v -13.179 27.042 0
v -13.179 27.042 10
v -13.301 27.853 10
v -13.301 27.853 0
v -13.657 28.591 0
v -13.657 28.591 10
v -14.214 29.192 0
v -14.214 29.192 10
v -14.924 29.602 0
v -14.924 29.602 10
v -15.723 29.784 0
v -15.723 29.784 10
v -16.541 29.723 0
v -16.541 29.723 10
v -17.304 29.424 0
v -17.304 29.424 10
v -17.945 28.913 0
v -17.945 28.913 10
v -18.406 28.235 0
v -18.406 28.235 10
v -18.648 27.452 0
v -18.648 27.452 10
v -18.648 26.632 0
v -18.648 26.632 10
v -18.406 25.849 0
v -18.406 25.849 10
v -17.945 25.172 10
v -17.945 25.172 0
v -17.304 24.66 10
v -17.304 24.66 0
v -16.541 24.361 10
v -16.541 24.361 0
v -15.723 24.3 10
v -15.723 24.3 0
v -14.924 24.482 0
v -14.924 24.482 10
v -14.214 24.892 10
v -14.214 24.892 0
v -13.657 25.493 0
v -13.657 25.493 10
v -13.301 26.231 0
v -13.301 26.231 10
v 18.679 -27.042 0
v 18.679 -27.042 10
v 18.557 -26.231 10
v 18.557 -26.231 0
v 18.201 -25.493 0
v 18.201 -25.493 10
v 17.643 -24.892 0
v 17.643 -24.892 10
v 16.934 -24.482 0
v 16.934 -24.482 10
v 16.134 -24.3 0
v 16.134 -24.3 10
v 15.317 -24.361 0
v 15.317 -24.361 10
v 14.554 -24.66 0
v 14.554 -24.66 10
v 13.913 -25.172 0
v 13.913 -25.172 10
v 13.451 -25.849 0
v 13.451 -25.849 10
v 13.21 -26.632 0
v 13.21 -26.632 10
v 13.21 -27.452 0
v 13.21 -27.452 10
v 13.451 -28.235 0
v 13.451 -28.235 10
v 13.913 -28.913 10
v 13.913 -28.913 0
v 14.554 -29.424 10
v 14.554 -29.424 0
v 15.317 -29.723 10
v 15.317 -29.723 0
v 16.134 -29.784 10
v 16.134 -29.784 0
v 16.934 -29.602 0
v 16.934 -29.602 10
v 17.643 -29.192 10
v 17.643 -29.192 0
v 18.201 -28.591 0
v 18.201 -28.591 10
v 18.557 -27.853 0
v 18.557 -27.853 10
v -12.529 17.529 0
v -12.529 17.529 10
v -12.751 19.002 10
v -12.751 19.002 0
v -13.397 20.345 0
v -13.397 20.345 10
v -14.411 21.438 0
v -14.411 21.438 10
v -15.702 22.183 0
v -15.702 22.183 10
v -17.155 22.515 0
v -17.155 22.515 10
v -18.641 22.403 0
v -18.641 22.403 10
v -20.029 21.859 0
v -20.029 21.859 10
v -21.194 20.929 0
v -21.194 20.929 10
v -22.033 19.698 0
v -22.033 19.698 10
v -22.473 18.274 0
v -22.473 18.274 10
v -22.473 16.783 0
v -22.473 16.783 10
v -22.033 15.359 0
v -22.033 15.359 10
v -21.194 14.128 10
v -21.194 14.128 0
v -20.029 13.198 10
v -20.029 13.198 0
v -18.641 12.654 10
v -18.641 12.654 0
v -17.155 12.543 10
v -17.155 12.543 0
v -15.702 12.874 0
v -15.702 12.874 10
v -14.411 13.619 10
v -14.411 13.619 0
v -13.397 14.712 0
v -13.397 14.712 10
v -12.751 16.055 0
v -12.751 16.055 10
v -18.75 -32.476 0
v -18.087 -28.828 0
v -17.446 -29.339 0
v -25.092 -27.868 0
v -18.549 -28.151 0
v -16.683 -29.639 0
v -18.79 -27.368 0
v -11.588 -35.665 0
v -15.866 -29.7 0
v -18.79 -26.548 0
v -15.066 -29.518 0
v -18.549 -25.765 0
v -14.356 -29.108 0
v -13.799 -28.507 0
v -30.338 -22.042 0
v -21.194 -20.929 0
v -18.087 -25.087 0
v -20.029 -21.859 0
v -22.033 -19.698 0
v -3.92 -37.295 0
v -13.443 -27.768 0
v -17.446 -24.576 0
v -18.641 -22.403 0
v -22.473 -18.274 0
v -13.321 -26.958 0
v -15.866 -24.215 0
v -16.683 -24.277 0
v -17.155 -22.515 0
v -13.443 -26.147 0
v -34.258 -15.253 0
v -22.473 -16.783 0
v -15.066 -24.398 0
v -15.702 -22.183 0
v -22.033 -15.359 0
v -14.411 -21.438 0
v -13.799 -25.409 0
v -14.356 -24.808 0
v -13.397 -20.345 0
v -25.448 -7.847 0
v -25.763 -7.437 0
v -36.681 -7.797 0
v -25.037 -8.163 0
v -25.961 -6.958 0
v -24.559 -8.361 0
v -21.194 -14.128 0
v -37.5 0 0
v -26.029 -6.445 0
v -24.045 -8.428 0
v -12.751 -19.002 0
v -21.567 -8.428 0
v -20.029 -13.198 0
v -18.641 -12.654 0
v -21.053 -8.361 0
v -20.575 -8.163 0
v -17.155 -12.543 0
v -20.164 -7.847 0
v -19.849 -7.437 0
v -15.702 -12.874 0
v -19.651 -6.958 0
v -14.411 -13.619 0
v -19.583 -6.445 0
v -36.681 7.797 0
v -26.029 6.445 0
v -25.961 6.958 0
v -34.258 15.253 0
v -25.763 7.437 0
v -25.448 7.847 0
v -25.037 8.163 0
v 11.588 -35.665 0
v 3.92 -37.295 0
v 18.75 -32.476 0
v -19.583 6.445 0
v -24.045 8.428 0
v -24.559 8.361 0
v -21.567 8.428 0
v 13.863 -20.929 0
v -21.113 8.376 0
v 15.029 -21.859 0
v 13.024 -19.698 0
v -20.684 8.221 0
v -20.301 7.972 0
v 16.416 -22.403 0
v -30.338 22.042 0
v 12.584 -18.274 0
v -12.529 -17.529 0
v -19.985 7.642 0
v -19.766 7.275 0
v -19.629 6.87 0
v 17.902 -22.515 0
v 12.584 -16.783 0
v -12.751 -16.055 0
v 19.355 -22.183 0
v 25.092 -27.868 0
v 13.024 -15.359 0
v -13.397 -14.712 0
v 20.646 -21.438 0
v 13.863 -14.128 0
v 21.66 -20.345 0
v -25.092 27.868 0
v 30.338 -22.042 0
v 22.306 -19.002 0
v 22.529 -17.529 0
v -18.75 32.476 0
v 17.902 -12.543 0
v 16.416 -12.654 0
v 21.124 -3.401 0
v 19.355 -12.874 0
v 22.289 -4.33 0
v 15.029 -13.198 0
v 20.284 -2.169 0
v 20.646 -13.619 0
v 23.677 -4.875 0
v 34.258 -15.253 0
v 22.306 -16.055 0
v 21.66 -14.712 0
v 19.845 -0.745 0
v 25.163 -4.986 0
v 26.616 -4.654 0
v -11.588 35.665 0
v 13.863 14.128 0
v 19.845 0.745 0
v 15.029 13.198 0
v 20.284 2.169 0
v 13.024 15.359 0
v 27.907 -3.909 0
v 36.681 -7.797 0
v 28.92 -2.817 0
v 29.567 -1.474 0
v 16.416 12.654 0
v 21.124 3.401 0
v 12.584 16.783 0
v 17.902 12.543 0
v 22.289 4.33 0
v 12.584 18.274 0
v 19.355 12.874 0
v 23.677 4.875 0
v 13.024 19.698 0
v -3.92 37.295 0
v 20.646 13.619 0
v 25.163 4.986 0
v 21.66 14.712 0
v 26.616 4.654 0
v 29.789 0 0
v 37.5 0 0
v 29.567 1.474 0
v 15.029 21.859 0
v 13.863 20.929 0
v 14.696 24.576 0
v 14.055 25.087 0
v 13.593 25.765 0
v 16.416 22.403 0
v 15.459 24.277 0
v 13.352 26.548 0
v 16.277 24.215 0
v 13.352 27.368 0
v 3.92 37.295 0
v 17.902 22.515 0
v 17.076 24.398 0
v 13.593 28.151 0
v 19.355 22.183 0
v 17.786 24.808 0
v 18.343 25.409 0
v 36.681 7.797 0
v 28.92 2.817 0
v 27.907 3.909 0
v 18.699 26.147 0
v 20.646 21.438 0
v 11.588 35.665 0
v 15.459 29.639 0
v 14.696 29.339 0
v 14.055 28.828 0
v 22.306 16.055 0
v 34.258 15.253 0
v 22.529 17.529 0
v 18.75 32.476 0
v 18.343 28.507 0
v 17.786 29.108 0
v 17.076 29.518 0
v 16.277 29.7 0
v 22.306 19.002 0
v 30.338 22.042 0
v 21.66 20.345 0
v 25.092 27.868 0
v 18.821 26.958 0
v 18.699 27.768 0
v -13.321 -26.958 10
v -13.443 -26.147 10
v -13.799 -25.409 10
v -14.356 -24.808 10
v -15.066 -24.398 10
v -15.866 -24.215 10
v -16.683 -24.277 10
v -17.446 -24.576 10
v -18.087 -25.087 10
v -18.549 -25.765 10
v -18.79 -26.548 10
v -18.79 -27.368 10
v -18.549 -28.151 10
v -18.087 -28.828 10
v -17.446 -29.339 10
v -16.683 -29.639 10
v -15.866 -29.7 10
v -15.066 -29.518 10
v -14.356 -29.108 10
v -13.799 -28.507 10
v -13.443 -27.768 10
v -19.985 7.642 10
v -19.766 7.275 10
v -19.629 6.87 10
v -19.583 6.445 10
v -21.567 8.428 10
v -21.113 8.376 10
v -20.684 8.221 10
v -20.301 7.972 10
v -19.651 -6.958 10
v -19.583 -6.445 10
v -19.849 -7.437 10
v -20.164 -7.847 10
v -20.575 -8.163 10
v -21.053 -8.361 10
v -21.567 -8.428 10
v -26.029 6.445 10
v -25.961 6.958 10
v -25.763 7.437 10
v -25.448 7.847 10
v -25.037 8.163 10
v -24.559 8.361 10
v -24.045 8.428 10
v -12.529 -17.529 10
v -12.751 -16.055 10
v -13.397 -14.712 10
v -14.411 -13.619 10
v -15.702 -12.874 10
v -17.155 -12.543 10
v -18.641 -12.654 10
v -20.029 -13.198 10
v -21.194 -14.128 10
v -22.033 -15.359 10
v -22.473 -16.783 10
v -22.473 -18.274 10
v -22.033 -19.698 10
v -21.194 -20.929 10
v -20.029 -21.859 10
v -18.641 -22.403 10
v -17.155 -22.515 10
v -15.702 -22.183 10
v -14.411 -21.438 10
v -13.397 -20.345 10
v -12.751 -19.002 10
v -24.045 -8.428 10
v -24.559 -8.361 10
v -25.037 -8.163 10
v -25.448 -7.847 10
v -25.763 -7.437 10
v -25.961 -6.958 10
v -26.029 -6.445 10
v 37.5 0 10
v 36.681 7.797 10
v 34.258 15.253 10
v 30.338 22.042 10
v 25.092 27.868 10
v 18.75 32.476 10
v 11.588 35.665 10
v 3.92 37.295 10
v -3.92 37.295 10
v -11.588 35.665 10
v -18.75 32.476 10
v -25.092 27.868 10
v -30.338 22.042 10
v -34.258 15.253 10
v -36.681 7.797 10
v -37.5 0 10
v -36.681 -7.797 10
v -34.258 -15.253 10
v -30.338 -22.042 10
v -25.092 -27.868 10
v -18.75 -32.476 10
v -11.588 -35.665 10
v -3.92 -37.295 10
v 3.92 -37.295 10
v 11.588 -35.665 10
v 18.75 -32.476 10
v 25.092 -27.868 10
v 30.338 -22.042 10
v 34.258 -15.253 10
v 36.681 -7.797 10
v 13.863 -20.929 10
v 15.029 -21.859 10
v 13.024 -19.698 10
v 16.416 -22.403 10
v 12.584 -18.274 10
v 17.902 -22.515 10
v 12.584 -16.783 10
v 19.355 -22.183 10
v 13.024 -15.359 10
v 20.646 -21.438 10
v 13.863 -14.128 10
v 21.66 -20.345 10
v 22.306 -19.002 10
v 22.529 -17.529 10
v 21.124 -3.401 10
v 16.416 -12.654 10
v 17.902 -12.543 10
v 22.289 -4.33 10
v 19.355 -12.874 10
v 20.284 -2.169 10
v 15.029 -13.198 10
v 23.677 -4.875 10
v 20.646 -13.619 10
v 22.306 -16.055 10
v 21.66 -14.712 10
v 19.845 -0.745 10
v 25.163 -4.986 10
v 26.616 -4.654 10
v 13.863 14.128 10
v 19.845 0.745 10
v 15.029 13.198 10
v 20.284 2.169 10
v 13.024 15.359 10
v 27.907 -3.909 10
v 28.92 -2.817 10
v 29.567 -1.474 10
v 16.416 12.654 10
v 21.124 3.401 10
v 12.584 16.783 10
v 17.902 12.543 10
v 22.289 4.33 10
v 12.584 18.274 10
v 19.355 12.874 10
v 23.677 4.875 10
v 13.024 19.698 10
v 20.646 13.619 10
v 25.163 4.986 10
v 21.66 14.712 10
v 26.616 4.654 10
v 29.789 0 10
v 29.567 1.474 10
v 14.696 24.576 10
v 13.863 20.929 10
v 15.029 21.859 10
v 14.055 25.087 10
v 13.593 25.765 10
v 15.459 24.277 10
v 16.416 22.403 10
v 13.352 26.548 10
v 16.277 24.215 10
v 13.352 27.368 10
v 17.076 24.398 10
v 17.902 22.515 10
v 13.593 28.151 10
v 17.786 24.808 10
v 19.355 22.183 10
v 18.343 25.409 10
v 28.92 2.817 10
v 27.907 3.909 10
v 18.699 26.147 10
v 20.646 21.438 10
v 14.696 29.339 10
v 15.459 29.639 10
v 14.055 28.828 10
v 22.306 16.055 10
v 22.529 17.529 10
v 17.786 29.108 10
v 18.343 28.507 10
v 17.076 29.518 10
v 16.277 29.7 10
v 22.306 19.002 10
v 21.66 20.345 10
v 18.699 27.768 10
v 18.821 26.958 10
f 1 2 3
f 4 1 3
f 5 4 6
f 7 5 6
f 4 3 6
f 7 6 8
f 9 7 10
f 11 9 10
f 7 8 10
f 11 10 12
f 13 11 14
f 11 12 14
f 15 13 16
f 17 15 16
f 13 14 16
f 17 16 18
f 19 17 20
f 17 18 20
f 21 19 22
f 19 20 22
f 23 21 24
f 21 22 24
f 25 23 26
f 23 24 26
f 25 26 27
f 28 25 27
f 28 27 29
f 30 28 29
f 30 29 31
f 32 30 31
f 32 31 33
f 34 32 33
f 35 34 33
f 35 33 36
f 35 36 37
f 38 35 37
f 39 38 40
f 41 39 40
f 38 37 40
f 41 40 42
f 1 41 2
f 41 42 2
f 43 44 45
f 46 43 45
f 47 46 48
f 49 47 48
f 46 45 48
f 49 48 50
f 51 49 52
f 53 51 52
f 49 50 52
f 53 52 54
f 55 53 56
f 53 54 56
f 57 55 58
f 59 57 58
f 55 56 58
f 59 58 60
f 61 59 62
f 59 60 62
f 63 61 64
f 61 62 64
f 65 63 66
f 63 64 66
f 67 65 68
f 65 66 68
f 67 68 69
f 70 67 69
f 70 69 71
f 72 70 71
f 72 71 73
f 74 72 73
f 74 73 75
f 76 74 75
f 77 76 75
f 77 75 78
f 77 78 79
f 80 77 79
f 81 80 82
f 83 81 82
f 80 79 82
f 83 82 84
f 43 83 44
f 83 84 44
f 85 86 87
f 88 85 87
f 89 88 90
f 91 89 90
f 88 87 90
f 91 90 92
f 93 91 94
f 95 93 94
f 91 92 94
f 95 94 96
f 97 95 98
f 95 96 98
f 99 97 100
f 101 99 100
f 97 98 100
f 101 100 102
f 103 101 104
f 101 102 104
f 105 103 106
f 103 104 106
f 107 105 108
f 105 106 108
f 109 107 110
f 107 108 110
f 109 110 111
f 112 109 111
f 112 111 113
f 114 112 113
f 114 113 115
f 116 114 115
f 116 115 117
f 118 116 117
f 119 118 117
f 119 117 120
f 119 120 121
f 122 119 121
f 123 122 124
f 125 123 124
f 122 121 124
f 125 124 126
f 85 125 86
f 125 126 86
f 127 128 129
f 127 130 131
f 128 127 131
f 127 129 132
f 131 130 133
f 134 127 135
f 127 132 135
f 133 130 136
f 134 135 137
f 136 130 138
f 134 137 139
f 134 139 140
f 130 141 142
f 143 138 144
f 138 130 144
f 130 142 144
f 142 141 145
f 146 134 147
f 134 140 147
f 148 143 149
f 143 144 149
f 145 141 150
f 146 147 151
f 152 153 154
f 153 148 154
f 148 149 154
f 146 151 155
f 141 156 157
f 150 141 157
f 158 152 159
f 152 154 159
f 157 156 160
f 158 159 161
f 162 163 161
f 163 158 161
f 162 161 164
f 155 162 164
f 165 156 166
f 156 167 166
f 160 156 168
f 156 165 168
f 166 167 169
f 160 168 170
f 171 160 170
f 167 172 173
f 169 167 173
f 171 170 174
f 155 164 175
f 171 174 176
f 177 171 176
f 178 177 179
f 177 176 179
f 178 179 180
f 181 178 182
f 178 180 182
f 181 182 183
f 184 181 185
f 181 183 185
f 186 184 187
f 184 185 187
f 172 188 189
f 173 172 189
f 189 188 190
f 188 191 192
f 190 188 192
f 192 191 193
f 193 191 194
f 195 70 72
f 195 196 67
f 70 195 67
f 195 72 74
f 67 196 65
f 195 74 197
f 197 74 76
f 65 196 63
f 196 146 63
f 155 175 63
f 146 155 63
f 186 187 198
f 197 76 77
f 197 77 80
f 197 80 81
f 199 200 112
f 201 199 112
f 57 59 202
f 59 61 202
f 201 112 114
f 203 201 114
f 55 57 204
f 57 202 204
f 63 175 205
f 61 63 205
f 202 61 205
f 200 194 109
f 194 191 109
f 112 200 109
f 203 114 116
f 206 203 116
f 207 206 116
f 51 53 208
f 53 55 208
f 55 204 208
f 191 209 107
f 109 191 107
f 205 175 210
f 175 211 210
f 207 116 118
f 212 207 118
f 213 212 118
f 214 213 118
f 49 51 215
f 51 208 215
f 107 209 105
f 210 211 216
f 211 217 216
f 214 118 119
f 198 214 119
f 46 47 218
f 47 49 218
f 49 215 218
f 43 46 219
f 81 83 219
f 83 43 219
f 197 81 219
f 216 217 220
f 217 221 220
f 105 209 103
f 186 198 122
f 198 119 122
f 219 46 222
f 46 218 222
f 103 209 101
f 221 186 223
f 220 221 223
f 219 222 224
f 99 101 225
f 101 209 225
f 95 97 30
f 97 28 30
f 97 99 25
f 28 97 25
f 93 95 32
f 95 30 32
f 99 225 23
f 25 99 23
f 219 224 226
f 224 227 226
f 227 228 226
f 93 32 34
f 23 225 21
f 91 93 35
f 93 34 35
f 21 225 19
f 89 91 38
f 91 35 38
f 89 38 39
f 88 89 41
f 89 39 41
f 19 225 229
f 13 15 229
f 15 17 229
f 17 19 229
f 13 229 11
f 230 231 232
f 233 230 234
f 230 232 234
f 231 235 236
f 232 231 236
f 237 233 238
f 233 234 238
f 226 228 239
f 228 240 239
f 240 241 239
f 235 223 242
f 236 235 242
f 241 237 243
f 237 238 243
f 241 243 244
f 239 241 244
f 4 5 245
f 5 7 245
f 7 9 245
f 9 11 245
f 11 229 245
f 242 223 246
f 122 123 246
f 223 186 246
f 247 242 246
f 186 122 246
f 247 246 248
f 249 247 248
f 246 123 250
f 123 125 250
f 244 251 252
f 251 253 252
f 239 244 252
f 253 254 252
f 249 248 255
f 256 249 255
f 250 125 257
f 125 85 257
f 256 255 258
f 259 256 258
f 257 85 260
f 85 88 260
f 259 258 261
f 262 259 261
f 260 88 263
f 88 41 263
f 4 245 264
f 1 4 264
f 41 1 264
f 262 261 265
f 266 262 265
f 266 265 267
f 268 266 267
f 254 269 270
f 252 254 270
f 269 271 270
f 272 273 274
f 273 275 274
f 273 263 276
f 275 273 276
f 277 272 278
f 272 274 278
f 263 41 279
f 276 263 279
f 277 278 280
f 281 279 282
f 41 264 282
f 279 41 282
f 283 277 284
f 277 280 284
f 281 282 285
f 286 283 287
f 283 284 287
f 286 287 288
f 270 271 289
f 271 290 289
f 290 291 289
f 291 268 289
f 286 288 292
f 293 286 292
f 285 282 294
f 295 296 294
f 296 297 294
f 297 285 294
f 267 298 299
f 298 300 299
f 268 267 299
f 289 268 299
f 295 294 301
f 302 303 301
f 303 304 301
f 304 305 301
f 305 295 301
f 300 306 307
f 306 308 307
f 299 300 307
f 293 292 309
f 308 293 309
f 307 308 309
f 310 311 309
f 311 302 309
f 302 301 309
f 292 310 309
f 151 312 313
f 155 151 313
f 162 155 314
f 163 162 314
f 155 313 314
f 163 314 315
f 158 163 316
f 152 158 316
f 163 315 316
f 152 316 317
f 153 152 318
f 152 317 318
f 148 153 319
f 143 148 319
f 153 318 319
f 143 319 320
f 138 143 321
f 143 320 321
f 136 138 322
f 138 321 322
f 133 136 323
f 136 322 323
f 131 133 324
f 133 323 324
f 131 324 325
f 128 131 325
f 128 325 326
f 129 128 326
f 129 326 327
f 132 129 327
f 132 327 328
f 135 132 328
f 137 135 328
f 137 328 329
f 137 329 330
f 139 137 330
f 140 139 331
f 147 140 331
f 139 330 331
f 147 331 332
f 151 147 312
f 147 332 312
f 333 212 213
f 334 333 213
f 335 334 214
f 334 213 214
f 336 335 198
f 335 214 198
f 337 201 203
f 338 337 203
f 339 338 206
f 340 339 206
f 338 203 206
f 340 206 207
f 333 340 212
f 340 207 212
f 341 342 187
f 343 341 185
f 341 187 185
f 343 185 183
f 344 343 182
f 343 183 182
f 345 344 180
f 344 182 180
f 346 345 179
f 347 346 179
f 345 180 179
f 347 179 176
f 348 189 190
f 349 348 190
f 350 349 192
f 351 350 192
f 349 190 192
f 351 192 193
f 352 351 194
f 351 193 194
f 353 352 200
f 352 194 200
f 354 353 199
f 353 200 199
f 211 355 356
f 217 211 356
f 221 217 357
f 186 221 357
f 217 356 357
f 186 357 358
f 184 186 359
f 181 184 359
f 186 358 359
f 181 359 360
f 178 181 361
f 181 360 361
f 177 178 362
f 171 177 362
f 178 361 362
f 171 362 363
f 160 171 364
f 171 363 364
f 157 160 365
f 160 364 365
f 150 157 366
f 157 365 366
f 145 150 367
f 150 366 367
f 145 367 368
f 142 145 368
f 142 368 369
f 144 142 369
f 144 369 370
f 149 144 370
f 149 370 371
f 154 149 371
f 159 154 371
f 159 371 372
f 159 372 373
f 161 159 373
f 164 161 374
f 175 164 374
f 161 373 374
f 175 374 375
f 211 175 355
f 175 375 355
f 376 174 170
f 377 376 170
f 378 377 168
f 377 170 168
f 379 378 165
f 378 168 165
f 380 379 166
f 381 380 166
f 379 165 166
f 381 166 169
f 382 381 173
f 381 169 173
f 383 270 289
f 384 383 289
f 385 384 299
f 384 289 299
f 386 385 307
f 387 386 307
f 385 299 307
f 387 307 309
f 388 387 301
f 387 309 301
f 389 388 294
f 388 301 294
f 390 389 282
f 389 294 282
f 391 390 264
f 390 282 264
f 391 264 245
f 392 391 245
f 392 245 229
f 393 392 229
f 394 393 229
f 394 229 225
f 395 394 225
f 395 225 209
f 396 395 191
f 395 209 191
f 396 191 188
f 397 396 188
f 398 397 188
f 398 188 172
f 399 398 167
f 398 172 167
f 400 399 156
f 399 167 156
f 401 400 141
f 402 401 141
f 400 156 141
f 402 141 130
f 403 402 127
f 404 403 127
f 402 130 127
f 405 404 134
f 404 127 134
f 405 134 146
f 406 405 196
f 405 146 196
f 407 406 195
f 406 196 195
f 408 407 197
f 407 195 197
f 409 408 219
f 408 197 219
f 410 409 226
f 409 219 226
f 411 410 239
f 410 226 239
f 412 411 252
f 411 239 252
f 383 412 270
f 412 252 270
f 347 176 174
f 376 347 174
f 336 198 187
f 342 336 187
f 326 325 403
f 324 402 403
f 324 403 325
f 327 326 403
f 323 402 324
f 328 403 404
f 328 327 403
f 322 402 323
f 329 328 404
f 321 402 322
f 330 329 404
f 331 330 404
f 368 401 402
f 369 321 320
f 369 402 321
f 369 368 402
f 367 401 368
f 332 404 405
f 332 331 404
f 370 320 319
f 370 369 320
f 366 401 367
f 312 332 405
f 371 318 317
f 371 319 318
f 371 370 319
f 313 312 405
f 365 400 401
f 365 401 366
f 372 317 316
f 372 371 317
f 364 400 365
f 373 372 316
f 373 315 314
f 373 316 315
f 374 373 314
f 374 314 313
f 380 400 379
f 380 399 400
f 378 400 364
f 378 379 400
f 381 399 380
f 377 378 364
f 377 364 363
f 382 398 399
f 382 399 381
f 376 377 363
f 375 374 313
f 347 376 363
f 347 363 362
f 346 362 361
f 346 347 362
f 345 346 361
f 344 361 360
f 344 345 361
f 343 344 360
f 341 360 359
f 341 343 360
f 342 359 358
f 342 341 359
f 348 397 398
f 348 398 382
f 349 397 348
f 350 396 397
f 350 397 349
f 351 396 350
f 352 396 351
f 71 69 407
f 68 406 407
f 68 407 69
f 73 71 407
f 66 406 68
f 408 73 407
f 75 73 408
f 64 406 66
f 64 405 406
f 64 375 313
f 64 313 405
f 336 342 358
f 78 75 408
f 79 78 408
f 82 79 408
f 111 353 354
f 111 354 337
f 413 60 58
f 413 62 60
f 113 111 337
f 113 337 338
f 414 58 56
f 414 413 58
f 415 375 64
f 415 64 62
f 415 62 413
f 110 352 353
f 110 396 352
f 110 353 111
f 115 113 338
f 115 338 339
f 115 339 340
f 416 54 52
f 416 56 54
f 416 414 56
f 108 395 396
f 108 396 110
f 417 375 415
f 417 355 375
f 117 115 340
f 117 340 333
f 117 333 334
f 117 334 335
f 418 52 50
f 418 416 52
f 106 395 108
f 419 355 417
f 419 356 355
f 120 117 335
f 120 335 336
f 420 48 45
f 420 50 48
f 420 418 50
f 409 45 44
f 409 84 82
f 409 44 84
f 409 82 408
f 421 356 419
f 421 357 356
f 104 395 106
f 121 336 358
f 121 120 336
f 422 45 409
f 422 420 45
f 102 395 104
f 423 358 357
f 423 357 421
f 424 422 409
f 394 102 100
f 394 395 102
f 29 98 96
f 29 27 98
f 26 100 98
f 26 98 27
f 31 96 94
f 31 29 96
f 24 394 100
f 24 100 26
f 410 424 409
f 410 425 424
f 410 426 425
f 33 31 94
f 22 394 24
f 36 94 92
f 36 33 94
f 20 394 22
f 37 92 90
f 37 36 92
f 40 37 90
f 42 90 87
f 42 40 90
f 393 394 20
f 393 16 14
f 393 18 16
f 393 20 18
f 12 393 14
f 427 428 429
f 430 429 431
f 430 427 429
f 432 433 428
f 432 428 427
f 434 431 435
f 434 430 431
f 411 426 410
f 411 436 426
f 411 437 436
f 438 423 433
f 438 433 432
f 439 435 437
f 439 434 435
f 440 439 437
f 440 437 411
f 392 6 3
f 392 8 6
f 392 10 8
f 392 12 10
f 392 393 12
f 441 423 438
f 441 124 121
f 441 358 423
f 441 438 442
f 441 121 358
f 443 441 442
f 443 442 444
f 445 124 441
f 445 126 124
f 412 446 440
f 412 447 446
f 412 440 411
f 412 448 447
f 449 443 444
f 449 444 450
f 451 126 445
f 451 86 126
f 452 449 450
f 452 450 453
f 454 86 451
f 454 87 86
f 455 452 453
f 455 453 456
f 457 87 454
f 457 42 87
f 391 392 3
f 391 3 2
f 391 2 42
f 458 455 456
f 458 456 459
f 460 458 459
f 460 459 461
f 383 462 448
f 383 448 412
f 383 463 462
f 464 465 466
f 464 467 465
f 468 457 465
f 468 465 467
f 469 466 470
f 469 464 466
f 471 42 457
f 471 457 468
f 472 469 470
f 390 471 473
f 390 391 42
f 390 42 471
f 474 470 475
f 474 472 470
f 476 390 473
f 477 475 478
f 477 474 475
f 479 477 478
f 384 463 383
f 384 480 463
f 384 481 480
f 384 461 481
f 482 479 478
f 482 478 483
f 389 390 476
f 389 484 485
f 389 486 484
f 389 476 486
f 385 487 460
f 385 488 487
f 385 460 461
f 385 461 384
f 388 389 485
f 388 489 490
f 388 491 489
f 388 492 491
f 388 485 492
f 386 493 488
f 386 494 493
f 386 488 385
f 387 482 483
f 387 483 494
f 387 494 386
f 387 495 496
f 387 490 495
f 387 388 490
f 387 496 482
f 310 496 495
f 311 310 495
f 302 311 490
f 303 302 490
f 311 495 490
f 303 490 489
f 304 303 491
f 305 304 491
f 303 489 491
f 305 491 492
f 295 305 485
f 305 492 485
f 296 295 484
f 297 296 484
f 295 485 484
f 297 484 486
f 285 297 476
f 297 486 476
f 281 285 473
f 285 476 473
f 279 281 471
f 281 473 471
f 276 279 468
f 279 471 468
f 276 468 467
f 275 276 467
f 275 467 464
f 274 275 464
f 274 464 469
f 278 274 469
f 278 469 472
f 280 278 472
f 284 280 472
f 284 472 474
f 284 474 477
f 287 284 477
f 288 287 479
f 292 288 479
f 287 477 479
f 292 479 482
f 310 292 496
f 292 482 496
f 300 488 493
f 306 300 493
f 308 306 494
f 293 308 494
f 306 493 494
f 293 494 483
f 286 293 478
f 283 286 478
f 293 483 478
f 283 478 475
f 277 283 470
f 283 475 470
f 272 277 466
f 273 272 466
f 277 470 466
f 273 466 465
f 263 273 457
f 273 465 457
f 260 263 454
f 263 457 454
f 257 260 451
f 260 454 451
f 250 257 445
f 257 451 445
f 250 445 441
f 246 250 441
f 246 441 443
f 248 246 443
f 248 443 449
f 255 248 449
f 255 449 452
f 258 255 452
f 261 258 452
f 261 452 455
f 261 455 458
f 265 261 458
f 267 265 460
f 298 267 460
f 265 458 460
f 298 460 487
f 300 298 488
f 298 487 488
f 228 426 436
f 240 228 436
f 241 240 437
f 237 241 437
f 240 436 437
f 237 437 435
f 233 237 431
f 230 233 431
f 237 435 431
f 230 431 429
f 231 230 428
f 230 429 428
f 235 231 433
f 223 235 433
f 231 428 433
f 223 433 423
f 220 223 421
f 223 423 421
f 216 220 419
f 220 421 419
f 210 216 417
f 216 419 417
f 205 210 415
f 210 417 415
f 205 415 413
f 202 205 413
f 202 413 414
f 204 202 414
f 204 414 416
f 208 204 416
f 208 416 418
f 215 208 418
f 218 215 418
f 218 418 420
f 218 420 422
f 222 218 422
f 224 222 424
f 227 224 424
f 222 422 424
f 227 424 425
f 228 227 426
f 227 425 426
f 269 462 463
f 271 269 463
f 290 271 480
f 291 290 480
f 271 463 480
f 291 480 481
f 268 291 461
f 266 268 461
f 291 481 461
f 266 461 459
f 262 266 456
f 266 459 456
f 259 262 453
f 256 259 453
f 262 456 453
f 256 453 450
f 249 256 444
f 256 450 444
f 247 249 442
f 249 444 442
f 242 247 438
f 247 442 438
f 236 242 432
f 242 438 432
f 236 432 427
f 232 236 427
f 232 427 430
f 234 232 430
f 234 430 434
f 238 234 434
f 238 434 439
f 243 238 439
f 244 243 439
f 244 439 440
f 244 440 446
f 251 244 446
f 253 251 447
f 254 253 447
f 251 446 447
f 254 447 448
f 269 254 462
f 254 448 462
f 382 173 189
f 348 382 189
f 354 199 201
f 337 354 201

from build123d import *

# Parameters (mm, degrees)
SKETCH_1_R          = 37.5
EXTRUDE_1_DEPTH     = 10
SKETCH_2_R          = 5
CUT_EXTRUDE_1_DEPTH = 10
SKETCH_4_R          = 2.75
CUT_EXTRUDE_2_DEPTH = 10


with BuildPart() as part:
    # 草图1 → 凸台-拉伸1 (new body)
    with BuildSketch(Plane.XY):
        Circle(SKETCH_1_R)
        with BuildLine():
            ThreePointArc((-20.75113276, -17.528548354), (-17.528548354, -14.305963949), (-14.305963949, -17.528548354))
            ThreePointArc((-14.305963949, -17.528548354), (-17.528548354, -20.75113276), (-20.75113276, -17.528548354))
        make_face(mode=Mode.SUBTRACT)
        with BuildLine():
            ThreePointArc((14.305963949, -17.528548354), (17.528548354, -14.305963949), (20.75113276, -17.528548354))
            ThreePointArc((20.75113276, -17.528548354), (17.528548354, -20.75113276), (14.305963949, -17.528548354))
        make_face(mode=Mode.SUBTRACT)
        with BuildLine():
            Line((-24.045437487, 8.428297676), (-21.566526406, 8.428297676))
            ThreePointArc((-21.566526406, 8.428297676), (-20.68362959, 8.220920288), (-19.985383241, 7.642159365))
            ThreePointArc((-19.985383241, 7.642159365), (-19.686578169, 7.076512396), (-19.583397541, 6.445168811))
            Line((-19.583397541, 6.445168811), (-19.583397541, -6.445168811))
            ThreePointArc((-19.583397541, -6.445168811), (-20.164242538, -7.847452679), (-21.566526406, -8.428297676))
            Line((-21.566526406, -8.428297676), (-24.045437487, -8.428297676))
            ThreePointArc((-24.045437487, -8.428297676), (-25.447721356, -7.847452679), (-26.028566352, -6.445168811))
            Line((-26.028566352, -6.445168811), (-26.028566352, 6.445168811))
            ThreePointArc((-26.028566352, 6.445168811), (-25.447721356, 7.847452679), (-24.045437487, 8.428297676))
        make_face(mode=Mode.SUBTRACT)
        with BuildLine():
            ThreePointArc((-20.75113276, 17.528548354), (-17.528548354, 20.75113276), (-14.305963949, 17.528548354))
            ThreePointArc((-14.305963949, 17.528548354), (-17.528548354, 14.305963949), (-20.75113276, 17.528548354))
        make_face(mode=Mode.SUBTRACT)
        with BuildLine():
            ThreePointArc((14.305963949, 17.528548354), (17.528548354, 20.75113276), (20.75113276, 17.528548354))
            ThreePointArc((20.75113276, 17.528548354), (17.528548354, 14.305963949), (14.305963949, 17.528548354))
        make_face(mode=Mode.SUBTRACT)
        with BuildLine():
            ThreePointArc((21.814417514, 0), (24.789110812, 2.974693297), (27.763804109, 0))
            ThreePointArc((27.763804109, 0), (24.789110812, -2.974693297), (21.814417514, 0))
        make_face(mode=Mode.SUBTRACT)
    extrude(amount=EXTRUDE_1_DEPTH)

    # 草图2 → 切除-拉伸1 (cut)
    with BuildSketch(Plane.XY.offset(10)):
        with Locations((-17.528548354, 17.528548354)):
            Circle(SKETCH_2_R)
        with BuildLine():
            ThreePointArc((-20.75113276, 17.528548354), (-17.528548354, 14.305963949), (-14.305963949, 17.528548354))
            ThreePointArc((-14.305963949, 17.528548354), (-17.528548354, 20.75113276), (-20.75113276, 17.528548354))
        make_face(mode=Mode.SUBTRACT)
        with Locations((17.528548354, 17.528548354)):
            Circle(SKETCH_2_R)
        with BuildLine():
            ThreePointArc((20.75113276, 17.528548354), (17.528548354, 20.75113276), (14.305963949, 17.528548354))
            ThreePointArc((14.305963949, 17.528548354), (17.528548354, 14.305963949), (20.75113276, 17.528548354))
        make_face(mode=Mode.SUBTRACT)
        with Locations((-17.528548354, -17.528548354)):
            Circle(SKETCH_2_R)
        with BuildLine():
            ThreePointArc((-20.75113276, -17.528548354), (-17.528548354, -20.75113276), (-14.305963949, -17.528548354))
            ThreePointArc((-14.305963949, -17.528548354), (-17.528548354, -14.305963949), (-20.75113276, -17.528548354))
        make_face(mode=Mode.SUBTRACT)
        with Locations((17.528548354, -17.528548354)):
            Circle(SKETCH_2_R)
        with BuildLine():
            ThreePointArc((14.305963949, -17.528548354), (17.528548354, -20.75113276), (20.75113276, -17.528548354))
            ThreePointArc((20.75113276, -17.528548354), (17.528548354, -14.305963949), (14.305963949, -17.528548354))
        make_face(mode=Mode.SUBTRACT)
        with Locations((24.789110812, 0)):
            Circle(SKETCH_2_R)
        with BuildLine():
            ThreePointArc((21.814417514, 0), (24.789110812, -2.974693297), (27.763804109, 0))
            ThreePointArc((27.763804109, 0), (24.789110812, 2.974693297), (21.814417514, 0))
        make_face(mode=Mode.SUBTRACT)
    extrude(amount=-CUT_EXTRUDE_1_DEPTH, mode=Mode.SUBTRACT)

    # 草图4 → 切除-拉伸2 (cut)
    with BuildSketch(Plane.XY.offset(10)):
        with Locations((-16.071064876, -26.957760919)):
            Circle(SKETCH_4_R)
        with Locations((15.928824109, -27.042051743)):
            Circle(SKETCH_4_R)
        with Locations((16.071064876, 26.957760919)):
            Circle(SKETCH_4_R)
        with Locations((-15.928824109, 27.042051743)):
            Circle(SKETCH_4_R)
    extrude(amount=-CUT_EXTRUDE_2_DEPTH, mode=Mode.SUBTRACT)


solid = part.part
